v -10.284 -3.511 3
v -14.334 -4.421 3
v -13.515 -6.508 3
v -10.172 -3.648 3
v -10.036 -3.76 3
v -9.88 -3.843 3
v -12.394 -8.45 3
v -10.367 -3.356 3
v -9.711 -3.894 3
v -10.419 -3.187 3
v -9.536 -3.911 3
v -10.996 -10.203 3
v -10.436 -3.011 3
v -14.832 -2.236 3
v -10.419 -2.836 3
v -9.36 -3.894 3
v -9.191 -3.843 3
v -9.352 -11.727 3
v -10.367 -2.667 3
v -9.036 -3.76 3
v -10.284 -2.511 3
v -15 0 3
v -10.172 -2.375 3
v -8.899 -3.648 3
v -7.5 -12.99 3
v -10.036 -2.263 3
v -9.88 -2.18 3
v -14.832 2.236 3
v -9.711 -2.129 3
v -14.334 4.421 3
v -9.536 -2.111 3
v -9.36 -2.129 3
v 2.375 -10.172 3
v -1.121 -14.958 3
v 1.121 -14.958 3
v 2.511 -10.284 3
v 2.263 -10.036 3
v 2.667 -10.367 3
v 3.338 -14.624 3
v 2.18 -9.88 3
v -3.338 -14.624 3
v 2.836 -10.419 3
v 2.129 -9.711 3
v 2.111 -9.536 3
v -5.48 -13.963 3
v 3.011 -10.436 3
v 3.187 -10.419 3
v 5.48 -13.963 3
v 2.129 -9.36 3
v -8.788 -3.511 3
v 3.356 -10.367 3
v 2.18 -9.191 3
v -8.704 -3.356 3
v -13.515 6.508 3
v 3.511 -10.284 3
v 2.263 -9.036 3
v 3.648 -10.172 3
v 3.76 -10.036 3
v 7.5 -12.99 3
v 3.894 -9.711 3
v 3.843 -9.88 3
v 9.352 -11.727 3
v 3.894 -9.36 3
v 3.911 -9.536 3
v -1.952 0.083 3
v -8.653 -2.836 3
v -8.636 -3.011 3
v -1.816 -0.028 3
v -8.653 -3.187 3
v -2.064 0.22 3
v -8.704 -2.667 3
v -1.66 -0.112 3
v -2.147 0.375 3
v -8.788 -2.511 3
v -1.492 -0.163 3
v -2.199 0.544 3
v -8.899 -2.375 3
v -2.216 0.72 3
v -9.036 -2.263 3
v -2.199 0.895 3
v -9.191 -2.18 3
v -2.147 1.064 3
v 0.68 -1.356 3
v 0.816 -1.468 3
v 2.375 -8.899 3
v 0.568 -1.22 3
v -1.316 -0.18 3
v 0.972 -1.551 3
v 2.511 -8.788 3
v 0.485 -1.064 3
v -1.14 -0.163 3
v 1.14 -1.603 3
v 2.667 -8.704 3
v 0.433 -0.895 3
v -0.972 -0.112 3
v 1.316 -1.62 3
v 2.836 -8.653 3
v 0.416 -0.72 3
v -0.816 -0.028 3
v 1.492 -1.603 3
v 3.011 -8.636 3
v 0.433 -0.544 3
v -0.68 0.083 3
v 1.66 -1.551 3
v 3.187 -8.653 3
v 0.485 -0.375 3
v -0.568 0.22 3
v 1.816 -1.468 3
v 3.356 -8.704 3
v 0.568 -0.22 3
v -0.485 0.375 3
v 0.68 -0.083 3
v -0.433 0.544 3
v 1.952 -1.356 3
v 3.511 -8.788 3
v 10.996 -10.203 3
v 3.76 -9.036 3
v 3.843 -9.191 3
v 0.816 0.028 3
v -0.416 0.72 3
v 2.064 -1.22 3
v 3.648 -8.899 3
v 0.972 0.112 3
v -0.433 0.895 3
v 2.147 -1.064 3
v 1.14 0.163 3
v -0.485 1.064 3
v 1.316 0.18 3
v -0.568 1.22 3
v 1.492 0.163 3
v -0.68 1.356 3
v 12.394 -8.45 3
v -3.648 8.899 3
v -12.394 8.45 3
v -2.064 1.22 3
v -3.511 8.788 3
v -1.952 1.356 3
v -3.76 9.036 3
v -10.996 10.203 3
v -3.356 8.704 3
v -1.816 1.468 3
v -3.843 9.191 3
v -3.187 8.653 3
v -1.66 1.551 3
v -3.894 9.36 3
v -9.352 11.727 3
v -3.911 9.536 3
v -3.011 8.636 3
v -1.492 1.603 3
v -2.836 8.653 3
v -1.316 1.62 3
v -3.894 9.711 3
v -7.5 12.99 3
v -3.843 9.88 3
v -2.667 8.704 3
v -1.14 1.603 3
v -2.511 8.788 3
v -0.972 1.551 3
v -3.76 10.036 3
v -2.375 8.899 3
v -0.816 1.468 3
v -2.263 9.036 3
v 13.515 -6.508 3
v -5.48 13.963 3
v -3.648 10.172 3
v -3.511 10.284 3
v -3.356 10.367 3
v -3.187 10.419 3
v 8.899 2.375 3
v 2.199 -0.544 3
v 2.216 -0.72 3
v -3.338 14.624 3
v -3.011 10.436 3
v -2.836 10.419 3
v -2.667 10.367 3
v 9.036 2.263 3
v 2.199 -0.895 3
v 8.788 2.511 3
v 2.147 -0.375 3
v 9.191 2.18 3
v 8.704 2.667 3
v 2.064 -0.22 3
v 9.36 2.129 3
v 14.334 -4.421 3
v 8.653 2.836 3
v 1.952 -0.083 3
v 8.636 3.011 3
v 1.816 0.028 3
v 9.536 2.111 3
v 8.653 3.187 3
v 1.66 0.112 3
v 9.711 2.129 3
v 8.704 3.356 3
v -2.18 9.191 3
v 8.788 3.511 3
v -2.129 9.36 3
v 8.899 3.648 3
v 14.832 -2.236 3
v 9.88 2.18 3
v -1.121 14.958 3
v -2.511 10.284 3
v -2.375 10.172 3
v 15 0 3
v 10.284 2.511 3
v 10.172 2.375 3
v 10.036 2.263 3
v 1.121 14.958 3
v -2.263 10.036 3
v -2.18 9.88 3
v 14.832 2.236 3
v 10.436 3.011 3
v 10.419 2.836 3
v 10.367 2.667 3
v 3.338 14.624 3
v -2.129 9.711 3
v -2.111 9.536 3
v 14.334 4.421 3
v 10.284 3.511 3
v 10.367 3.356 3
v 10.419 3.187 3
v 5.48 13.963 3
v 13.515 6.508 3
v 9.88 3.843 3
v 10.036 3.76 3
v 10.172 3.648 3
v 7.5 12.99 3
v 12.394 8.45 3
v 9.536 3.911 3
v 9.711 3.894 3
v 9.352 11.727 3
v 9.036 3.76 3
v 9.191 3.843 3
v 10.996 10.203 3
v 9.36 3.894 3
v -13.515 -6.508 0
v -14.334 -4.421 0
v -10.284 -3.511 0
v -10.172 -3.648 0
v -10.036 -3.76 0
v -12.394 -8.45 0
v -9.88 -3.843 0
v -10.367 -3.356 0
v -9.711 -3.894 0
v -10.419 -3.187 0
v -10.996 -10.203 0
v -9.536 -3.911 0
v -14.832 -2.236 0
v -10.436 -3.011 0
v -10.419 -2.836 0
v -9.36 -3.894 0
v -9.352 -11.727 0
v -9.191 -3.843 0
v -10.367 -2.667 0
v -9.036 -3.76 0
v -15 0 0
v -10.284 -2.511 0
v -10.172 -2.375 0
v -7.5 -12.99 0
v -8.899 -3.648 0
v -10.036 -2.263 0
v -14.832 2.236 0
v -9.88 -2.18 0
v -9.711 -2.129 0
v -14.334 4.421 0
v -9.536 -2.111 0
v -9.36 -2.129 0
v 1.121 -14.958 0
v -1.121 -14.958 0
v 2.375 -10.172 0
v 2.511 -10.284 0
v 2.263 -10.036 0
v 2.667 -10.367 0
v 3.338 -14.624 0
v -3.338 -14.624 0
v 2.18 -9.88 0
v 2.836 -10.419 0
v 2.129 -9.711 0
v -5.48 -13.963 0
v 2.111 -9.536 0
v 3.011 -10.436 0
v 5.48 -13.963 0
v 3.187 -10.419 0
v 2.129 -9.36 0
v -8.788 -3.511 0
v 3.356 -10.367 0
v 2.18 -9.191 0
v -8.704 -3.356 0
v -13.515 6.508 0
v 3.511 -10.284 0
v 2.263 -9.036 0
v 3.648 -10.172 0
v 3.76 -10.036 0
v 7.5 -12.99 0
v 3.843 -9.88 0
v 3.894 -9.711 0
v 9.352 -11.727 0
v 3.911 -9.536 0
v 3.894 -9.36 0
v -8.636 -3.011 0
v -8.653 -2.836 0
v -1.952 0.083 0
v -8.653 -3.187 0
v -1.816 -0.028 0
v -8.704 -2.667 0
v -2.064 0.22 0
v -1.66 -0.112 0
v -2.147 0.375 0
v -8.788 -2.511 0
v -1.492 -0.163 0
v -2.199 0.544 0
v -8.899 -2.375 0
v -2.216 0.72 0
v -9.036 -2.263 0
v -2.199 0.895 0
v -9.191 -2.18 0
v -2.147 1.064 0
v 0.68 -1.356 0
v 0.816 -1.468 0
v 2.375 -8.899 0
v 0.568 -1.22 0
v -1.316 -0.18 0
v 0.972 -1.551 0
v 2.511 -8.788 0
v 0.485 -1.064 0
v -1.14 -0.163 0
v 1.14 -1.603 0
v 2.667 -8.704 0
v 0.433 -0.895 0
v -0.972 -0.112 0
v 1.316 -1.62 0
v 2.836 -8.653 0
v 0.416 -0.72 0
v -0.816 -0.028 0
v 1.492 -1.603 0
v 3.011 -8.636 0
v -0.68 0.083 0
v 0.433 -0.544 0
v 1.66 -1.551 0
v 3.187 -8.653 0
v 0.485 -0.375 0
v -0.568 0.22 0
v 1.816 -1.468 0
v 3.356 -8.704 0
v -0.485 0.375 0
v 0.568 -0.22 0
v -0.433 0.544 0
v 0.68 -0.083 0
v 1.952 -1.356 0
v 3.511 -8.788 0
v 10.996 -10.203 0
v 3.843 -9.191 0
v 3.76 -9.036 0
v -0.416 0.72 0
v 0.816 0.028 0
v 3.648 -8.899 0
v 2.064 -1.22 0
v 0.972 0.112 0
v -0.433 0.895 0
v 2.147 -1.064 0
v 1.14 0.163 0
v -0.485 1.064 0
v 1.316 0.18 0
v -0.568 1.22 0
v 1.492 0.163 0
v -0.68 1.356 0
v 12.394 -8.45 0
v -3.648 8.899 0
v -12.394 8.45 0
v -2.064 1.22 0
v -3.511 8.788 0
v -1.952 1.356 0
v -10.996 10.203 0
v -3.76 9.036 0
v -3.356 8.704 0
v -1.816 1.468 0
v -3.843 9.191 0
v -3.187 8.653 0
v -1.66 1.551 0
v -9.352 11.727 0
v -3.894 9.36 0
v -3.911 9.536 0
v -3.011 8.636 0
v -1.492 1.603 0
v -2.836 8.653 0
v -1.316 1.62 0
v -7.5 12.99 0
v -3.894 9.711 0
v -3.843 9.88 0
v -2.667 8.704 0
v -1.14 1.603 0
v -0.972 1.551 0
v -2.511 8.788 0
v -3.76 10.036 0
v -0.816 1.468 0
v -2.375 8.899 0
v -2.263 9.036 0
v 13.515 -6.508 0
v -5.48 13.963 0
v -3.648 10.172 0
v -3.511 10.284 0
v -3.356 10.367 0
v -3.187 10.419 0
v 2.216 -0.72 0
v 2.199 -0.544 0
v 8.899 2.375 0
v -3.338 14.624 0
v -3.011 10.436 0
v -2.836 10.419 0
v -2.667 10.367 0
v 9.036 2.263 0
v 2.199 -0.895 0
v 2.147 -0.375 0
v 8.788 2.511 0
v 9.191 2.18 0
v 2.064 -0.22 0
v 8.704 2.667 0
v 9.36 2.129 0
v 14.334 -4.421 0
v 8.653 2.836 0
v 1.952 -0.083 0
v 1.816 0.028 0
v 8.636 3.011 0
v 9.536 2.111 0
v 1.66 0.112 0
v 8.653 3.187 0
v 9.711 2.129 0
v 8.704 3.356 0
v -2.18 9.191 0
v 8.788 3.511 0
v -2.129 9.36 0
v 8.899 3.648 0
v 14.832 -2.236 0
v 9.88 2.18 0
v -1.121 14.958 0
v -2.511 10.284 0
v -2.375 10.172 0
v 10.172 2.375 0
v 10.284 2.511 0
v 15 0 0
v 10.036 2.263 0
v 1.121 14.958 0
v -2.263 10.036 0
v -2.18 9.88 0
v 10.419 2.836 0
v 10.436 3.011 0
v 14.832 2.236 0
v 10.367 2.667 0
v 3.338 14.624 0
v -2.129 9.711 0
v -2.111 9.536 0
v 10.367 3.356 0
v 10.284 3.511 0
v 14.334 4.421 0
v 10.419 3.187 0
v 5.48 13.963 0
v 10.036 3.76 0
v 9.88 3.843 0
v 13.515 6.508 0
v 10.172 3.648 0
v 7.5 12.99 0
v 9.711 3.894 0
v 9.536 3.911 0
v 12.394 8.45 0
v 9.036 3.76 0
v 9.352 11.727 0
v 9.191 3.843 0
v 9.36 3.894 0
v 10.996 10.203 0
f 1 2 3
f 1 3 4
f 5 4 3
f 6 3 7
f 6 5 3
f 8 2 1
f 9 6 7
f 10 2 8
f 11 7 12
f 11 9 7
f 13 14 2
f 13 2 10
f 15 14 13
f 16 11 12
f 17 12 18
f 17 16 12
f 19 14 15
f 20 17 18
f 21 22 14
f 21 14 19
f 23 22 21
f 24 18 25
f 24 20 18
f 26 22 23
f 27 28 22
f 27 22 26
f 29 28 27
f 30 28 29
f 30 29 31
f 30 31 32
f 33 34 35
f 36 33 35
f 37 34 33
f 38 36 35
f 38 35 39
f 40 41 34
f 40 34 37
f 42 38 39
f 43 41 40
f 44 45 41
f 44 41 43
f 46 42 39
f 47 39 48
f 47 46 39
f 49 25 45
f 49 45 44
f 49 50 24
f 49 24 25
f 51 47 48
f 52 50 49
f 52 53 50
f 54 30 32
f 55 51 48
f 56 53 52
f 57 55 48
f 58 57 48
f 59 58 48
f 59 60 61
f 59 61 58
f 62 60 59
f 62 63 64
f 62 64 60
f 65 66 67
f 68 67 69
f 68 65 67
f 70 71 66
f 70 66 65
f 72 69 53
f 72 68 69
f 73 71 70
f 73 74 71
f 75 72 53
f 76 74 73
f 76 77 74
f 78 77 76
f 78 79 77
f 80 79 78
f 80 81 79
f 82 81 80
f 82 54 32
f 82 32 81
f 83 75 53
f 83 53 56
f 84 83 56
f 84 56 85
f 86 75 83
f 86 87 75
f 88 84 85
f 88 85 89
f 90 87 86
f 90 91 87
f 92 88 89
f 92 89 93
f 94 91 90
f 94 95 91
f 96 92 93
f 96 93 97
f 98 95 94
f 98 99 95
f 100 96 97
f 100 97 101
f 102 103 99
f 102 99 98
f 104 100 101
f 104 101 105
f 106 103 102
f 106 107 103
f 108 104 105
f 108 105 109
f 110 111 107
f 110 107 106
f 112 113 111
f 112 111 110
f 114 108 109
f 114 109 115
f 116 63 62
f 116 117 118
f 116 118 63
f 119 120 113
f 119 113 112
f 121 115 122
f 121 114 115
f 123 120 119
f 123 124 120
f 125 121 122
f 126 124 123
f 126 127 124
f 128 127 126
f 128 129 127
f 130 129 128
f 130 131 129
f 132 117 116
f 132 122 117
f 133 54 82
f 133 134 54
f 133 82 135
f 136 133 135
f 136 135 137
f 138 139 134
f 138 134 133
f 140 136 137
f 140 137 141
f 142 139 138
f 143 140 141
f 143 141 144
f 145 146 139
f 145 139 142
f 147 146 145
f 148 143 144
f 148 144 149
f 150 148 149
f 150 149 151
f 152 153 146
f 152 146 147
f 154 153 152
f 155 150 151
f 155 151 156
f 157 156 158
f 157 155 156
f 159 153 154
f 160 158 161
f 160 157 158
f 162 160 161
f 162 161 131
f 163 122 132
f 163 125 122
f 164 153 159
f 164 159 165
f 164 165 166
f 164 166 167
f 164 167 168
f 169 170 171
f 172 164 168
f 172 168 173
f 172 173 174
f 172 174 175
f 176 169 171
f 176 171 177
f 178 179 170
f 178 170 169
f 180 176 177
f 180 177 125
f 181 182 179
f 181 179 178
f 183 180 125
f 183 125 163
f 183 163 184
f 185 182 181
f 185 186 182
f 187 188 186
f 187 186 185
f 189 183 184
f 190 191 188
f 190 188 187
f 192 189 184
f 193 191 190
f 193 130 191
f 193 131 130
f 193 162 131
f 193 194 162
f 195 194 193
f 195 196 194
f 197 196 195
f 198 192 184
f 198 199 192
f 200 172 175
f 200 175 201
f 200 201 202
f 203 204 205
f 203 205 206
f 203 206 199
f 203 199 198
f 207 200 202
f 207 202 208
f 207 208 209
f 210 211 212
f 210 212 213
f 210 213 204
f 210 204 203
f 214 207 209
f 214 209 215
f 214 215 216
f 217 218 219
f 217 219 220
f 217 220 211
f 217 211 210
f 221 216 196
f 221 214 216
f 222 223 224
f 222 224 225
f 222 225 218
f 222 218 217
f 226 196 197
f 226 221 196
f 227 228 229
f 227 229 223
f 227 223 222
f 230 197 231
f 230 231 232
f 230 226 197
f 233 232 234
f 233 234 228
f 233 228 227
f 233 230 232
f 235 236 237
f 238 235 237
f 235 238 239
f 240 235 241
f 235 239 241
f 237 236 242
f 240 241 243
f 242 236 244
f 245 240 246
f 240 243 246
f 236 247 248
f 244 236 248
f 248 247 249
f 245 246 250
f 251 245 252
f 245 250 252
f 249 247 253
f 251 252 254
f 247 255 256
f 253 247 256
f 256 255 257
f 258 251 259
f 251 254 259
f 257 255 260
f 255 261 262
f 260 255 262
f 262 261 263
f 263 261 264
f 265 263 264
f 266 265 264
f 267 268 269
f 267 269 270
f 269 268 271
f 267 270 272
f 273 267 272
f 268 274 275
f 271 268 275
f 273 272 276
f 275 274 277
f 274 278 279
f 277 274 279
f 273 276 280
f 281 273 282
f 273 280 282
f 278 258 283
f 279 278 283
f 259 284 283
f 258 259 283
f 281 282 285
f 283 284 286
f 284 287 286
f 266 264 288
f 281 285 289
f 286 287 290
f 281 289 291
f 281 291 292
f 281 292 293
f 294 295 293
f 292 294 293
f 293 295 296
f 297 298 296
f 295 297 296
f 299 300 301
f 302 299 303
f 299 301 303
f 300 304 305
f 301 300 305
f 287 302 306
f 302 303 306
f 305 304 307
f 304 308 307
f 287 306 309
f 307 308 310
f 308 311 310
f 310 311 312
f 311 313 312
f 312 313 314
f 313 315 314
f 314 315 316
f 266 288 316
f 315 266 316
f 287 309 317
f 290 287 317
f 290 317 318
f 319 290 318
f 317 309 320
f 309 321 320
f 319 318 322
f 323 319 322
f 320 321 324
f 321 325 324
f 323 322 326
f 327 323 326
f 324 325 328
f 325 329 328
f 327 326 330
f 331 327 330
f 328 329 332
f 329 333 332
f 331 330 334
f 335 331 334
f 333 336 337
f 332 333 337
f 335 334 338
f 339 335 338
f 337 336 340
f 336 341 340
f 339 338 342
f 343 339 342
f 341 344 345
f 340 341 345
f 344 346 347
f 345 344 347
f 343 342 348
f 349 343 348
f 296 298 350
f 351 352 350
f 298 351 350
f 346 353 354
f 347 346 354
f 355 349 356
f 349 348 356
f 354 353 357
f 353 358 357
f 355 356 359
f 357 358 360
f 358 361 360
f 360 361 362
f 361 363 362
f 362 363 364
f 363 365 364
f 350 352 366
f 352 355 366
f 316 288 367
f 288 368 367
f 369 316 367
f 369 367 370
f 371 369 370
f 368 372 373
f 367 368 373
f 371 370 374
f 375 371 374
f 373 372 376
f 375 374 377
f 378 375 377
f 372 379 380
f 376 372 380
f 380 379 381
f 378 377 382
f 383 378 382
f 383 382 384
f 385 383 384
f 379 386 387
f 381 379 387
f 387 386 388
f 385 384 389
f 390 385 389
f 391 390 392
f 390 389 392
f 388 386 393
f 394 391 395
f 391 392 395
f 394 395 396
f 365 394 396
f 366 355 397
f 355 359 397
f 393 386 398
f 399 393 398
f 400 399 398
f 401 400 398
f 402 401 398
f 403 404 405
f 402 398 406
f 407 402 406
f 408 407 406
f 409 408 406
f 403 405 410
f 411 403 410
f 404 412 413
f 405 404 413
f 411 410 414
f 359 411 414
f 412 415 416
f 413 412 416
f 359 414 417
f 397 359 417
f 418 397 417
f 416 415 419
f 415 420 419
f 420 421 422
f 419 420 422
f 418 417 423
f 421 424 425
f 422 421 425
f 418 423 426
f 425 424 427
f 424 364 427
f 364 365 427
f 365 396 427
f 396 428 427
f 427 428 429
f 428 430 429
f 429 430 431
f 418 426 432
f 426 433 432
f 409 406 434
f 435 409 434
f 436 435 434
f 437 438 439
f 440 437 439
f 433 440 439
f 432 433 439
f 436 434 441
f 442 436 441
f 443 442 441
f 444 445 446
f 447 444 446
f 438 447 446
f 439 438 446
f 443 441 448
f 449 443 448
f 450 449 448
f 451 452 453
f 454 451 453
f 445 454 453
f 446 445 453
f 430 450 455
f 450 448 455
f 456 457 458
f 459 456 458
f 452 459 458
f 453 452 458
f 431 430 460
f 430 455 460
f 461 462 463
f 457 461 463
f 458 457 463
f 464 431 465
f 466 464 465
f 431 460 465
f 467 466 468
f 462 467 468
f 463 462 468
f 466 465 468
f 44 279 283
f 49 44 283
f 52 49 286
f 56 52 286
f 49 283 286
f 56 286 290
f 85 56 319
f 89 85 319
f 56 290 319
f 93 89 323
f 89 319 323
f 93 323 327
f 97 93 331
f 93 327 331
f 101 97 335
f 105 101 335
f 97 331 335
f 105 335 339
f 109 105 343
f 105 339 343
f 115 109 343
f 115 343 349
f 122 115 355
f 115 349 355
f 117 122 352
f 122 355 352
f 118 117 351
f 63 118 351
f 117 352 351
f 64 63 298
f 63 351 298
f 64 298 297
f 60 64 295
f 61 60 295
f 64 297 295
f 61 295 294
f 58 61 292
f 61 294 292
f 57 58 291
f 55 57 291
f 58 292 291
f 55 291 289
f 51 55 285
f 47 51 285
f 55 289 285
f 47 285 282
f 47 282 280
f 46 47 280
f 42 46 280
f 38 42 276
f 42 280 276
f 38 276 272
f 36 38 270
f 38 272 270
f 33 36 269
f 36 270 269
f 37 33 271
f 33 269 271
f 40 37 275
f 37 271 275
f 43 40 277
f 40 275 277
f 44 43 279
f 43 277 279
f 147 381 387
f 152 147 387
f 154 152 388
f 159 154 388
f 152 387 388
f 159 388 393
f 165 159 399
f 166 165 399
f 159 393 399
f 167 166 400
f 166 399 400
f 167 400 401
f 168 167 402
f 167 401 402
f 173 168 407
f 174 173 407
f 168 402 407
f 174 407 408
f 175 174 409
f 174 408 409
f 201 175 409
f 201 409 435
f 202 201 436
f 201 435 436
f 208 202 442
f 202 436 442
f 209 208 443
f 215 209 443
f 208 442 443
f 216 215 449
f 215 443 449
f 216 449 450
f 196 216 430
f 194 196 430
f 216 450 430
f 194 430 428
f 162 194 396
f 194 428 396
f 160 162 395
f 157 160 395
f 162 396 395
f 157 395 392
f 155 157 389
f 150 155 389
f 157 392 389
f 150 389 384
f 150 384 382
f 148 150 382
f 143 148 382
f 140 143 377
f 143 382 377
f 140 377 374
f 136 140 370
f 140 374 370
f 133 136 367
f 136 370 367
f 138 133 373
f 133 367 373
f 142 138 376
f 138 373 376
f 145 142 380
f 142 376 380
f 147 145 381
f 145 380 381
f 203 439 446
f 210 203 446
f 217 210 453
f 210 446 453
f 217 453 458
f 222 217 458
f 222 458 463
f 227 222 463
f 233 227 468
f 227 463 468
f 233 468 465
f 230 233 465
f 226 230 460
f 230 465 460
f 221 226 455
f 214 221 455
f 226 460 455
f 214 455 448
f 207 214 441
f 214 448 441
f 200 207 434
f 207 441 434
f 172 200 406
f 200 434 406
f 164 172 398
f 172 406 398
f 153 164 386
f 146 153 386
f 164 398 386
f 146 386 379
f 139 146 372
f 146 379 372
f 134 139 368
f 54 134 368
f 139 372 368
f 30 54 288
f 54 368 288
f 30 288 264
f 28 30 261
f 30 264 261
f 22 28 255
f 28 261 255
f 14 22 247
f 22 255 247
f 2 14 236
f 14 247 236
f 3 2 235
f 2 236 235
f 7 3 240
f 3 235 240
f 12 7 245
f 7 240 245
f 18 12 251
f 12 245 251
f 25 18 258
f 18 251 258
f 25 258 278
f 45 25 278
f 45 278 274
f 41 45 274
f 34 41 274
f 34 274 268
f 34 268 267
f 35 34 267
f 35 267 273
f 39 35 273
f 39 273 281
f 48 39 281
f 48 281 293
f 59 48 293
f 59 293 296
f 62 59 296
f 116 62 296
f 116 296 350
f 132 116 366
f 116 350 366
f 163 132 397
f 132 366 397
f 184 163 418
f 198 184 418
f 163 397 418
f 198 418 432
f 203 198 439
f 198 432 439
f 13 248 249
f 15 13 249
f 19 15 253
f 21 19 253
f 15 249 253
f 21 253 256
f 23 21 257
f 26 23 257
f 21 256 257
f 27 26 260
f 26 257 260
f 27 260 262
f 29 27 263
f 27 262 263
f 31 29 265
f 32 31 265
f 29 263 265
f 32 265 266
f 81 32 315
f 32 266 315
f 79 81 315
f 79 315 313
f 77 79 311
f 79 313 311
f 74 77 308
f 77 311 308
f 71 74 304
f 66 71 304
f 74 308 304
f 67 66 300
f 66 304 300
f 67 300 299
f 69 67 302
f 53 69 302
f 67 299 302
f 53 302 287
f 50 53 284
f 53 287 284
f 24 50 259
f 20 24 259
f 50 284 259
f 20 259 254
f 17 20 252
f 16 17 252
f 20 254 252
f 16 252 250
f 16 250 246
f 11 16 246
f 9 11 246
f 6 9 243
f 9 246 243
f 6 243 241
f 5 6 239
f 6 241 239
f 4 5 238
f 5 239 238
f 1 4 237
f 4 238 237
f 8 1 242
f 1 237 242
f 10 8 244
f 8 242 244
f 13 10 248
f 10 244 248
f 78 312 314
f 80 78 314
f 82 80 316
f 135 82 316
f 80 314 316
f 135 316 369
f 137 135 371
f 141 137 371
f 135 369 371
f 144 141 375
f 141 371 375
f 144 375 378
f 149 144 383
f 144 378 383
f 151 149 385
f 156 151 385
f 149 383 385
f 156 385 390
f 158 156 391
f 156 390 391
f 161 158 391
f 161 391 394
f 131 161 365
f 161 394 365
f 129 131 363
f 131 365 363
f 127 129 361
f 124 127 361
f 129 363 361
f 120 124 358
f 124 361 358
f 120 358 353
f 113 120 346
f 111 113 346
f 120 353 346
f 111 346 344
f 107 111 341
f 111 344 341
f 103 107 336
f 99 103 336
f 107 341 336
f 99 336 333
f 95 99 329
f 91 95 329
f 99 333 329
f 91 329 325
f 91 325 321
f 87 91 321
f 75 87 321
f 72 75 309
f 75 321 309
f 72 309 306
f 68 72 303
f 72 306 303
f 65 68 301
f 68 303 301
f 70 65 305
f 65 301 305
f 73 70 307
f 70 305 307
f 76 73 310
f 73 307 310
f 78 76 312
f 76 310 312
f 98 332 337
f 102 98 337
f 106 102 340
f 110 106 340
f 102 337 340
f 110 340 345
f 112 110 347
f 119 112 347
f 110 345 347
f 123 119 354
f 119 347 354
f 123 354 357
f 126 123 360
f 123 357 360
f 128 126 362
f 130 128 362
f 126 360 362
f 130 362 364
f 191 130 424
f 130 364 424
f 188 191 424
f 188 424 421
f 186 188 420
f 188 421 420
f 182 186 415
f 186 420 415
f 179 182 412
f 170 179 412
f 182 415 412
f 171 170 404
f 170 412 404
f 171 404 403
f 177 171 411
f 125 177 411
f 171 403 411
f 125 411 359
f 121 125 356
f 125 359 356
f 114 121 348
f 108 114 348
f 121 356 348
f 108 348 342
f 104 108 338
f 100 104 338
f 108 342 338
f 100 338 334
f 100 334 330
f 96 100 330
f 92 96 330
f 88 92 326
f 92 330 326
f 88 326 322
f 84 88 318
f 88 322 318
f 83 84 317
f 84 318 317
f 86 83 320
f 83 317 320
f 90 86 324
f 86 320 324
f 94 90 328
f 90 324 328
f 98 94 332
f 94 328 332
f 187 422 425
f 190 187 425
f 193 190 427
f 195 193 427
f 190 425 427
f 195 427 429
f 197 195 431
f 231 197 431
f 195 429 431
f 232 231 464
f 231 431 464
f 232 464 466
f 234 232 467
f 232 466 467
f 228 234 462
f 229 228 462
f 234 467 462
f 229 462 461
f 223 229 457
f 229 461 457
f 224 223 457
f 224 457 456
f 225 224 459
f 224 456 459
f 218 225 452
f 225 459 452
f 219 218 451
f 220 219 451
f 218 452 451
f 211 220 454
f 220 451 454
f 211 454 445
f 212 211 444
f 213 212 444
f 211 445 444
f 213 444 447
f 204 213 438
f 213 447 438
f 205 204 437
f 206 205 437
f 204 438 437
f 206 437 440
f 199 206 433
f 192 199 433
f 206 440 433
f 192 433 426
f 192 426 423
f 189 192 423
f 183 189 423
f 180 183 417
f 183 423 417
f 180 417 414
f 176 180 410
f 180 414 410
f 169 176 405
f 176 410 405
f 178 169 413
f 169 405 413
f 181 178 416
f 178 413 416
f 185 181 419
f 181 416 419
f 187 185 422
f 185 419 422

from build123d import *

# Parameters (mm, degrees)
SKETCH1_R           = 15
BOSS_EXTRUDE1_DEPTH = 3
SKETCH2_R           = 0.9
CUT_EXTRUDE1_DEPTH  = 3


with BuildPart() as part:
    # Sketch1 → Boss-Extrude1 (new body)
    with BuildSketch(Plane.XY):
        Circle(SKETCH1_R)
    extrude(amount=BOSS_EXTRUDE1_DEPTH)

    # Sketch2 → Cut-Extrude1 (cut)
    with BuildSketch(Plane(origin=(0, 0, 0), x_dir=(-1, 0, 0), z_dir=(0, 0, -1))):
        with Locations((-1.31599788, -0.719826076)):
            Circle(SKETCH2_R)
        with Locations((1.31599788, 0.719826076)):
            Circle(SKETCH2_R)
        with Locations((-3.011222811, -9.535855346)):
            Circle(SKETCH2_R)
        with Locations((-9.535855346, 3.011222811)):
            Circle(SKETCH2_R)
        with Locations((3.011222811, 9.535855346)):
            Circle(SKETCH2_R)
        with Locations((9.535855346, -3.011222811)):
            Circle(SKETCH2_R)
    extrude(amount=-CUT_EXTRUDE1_DEPTH, mode=Mode.SUBTRACT)


solid = part.part
